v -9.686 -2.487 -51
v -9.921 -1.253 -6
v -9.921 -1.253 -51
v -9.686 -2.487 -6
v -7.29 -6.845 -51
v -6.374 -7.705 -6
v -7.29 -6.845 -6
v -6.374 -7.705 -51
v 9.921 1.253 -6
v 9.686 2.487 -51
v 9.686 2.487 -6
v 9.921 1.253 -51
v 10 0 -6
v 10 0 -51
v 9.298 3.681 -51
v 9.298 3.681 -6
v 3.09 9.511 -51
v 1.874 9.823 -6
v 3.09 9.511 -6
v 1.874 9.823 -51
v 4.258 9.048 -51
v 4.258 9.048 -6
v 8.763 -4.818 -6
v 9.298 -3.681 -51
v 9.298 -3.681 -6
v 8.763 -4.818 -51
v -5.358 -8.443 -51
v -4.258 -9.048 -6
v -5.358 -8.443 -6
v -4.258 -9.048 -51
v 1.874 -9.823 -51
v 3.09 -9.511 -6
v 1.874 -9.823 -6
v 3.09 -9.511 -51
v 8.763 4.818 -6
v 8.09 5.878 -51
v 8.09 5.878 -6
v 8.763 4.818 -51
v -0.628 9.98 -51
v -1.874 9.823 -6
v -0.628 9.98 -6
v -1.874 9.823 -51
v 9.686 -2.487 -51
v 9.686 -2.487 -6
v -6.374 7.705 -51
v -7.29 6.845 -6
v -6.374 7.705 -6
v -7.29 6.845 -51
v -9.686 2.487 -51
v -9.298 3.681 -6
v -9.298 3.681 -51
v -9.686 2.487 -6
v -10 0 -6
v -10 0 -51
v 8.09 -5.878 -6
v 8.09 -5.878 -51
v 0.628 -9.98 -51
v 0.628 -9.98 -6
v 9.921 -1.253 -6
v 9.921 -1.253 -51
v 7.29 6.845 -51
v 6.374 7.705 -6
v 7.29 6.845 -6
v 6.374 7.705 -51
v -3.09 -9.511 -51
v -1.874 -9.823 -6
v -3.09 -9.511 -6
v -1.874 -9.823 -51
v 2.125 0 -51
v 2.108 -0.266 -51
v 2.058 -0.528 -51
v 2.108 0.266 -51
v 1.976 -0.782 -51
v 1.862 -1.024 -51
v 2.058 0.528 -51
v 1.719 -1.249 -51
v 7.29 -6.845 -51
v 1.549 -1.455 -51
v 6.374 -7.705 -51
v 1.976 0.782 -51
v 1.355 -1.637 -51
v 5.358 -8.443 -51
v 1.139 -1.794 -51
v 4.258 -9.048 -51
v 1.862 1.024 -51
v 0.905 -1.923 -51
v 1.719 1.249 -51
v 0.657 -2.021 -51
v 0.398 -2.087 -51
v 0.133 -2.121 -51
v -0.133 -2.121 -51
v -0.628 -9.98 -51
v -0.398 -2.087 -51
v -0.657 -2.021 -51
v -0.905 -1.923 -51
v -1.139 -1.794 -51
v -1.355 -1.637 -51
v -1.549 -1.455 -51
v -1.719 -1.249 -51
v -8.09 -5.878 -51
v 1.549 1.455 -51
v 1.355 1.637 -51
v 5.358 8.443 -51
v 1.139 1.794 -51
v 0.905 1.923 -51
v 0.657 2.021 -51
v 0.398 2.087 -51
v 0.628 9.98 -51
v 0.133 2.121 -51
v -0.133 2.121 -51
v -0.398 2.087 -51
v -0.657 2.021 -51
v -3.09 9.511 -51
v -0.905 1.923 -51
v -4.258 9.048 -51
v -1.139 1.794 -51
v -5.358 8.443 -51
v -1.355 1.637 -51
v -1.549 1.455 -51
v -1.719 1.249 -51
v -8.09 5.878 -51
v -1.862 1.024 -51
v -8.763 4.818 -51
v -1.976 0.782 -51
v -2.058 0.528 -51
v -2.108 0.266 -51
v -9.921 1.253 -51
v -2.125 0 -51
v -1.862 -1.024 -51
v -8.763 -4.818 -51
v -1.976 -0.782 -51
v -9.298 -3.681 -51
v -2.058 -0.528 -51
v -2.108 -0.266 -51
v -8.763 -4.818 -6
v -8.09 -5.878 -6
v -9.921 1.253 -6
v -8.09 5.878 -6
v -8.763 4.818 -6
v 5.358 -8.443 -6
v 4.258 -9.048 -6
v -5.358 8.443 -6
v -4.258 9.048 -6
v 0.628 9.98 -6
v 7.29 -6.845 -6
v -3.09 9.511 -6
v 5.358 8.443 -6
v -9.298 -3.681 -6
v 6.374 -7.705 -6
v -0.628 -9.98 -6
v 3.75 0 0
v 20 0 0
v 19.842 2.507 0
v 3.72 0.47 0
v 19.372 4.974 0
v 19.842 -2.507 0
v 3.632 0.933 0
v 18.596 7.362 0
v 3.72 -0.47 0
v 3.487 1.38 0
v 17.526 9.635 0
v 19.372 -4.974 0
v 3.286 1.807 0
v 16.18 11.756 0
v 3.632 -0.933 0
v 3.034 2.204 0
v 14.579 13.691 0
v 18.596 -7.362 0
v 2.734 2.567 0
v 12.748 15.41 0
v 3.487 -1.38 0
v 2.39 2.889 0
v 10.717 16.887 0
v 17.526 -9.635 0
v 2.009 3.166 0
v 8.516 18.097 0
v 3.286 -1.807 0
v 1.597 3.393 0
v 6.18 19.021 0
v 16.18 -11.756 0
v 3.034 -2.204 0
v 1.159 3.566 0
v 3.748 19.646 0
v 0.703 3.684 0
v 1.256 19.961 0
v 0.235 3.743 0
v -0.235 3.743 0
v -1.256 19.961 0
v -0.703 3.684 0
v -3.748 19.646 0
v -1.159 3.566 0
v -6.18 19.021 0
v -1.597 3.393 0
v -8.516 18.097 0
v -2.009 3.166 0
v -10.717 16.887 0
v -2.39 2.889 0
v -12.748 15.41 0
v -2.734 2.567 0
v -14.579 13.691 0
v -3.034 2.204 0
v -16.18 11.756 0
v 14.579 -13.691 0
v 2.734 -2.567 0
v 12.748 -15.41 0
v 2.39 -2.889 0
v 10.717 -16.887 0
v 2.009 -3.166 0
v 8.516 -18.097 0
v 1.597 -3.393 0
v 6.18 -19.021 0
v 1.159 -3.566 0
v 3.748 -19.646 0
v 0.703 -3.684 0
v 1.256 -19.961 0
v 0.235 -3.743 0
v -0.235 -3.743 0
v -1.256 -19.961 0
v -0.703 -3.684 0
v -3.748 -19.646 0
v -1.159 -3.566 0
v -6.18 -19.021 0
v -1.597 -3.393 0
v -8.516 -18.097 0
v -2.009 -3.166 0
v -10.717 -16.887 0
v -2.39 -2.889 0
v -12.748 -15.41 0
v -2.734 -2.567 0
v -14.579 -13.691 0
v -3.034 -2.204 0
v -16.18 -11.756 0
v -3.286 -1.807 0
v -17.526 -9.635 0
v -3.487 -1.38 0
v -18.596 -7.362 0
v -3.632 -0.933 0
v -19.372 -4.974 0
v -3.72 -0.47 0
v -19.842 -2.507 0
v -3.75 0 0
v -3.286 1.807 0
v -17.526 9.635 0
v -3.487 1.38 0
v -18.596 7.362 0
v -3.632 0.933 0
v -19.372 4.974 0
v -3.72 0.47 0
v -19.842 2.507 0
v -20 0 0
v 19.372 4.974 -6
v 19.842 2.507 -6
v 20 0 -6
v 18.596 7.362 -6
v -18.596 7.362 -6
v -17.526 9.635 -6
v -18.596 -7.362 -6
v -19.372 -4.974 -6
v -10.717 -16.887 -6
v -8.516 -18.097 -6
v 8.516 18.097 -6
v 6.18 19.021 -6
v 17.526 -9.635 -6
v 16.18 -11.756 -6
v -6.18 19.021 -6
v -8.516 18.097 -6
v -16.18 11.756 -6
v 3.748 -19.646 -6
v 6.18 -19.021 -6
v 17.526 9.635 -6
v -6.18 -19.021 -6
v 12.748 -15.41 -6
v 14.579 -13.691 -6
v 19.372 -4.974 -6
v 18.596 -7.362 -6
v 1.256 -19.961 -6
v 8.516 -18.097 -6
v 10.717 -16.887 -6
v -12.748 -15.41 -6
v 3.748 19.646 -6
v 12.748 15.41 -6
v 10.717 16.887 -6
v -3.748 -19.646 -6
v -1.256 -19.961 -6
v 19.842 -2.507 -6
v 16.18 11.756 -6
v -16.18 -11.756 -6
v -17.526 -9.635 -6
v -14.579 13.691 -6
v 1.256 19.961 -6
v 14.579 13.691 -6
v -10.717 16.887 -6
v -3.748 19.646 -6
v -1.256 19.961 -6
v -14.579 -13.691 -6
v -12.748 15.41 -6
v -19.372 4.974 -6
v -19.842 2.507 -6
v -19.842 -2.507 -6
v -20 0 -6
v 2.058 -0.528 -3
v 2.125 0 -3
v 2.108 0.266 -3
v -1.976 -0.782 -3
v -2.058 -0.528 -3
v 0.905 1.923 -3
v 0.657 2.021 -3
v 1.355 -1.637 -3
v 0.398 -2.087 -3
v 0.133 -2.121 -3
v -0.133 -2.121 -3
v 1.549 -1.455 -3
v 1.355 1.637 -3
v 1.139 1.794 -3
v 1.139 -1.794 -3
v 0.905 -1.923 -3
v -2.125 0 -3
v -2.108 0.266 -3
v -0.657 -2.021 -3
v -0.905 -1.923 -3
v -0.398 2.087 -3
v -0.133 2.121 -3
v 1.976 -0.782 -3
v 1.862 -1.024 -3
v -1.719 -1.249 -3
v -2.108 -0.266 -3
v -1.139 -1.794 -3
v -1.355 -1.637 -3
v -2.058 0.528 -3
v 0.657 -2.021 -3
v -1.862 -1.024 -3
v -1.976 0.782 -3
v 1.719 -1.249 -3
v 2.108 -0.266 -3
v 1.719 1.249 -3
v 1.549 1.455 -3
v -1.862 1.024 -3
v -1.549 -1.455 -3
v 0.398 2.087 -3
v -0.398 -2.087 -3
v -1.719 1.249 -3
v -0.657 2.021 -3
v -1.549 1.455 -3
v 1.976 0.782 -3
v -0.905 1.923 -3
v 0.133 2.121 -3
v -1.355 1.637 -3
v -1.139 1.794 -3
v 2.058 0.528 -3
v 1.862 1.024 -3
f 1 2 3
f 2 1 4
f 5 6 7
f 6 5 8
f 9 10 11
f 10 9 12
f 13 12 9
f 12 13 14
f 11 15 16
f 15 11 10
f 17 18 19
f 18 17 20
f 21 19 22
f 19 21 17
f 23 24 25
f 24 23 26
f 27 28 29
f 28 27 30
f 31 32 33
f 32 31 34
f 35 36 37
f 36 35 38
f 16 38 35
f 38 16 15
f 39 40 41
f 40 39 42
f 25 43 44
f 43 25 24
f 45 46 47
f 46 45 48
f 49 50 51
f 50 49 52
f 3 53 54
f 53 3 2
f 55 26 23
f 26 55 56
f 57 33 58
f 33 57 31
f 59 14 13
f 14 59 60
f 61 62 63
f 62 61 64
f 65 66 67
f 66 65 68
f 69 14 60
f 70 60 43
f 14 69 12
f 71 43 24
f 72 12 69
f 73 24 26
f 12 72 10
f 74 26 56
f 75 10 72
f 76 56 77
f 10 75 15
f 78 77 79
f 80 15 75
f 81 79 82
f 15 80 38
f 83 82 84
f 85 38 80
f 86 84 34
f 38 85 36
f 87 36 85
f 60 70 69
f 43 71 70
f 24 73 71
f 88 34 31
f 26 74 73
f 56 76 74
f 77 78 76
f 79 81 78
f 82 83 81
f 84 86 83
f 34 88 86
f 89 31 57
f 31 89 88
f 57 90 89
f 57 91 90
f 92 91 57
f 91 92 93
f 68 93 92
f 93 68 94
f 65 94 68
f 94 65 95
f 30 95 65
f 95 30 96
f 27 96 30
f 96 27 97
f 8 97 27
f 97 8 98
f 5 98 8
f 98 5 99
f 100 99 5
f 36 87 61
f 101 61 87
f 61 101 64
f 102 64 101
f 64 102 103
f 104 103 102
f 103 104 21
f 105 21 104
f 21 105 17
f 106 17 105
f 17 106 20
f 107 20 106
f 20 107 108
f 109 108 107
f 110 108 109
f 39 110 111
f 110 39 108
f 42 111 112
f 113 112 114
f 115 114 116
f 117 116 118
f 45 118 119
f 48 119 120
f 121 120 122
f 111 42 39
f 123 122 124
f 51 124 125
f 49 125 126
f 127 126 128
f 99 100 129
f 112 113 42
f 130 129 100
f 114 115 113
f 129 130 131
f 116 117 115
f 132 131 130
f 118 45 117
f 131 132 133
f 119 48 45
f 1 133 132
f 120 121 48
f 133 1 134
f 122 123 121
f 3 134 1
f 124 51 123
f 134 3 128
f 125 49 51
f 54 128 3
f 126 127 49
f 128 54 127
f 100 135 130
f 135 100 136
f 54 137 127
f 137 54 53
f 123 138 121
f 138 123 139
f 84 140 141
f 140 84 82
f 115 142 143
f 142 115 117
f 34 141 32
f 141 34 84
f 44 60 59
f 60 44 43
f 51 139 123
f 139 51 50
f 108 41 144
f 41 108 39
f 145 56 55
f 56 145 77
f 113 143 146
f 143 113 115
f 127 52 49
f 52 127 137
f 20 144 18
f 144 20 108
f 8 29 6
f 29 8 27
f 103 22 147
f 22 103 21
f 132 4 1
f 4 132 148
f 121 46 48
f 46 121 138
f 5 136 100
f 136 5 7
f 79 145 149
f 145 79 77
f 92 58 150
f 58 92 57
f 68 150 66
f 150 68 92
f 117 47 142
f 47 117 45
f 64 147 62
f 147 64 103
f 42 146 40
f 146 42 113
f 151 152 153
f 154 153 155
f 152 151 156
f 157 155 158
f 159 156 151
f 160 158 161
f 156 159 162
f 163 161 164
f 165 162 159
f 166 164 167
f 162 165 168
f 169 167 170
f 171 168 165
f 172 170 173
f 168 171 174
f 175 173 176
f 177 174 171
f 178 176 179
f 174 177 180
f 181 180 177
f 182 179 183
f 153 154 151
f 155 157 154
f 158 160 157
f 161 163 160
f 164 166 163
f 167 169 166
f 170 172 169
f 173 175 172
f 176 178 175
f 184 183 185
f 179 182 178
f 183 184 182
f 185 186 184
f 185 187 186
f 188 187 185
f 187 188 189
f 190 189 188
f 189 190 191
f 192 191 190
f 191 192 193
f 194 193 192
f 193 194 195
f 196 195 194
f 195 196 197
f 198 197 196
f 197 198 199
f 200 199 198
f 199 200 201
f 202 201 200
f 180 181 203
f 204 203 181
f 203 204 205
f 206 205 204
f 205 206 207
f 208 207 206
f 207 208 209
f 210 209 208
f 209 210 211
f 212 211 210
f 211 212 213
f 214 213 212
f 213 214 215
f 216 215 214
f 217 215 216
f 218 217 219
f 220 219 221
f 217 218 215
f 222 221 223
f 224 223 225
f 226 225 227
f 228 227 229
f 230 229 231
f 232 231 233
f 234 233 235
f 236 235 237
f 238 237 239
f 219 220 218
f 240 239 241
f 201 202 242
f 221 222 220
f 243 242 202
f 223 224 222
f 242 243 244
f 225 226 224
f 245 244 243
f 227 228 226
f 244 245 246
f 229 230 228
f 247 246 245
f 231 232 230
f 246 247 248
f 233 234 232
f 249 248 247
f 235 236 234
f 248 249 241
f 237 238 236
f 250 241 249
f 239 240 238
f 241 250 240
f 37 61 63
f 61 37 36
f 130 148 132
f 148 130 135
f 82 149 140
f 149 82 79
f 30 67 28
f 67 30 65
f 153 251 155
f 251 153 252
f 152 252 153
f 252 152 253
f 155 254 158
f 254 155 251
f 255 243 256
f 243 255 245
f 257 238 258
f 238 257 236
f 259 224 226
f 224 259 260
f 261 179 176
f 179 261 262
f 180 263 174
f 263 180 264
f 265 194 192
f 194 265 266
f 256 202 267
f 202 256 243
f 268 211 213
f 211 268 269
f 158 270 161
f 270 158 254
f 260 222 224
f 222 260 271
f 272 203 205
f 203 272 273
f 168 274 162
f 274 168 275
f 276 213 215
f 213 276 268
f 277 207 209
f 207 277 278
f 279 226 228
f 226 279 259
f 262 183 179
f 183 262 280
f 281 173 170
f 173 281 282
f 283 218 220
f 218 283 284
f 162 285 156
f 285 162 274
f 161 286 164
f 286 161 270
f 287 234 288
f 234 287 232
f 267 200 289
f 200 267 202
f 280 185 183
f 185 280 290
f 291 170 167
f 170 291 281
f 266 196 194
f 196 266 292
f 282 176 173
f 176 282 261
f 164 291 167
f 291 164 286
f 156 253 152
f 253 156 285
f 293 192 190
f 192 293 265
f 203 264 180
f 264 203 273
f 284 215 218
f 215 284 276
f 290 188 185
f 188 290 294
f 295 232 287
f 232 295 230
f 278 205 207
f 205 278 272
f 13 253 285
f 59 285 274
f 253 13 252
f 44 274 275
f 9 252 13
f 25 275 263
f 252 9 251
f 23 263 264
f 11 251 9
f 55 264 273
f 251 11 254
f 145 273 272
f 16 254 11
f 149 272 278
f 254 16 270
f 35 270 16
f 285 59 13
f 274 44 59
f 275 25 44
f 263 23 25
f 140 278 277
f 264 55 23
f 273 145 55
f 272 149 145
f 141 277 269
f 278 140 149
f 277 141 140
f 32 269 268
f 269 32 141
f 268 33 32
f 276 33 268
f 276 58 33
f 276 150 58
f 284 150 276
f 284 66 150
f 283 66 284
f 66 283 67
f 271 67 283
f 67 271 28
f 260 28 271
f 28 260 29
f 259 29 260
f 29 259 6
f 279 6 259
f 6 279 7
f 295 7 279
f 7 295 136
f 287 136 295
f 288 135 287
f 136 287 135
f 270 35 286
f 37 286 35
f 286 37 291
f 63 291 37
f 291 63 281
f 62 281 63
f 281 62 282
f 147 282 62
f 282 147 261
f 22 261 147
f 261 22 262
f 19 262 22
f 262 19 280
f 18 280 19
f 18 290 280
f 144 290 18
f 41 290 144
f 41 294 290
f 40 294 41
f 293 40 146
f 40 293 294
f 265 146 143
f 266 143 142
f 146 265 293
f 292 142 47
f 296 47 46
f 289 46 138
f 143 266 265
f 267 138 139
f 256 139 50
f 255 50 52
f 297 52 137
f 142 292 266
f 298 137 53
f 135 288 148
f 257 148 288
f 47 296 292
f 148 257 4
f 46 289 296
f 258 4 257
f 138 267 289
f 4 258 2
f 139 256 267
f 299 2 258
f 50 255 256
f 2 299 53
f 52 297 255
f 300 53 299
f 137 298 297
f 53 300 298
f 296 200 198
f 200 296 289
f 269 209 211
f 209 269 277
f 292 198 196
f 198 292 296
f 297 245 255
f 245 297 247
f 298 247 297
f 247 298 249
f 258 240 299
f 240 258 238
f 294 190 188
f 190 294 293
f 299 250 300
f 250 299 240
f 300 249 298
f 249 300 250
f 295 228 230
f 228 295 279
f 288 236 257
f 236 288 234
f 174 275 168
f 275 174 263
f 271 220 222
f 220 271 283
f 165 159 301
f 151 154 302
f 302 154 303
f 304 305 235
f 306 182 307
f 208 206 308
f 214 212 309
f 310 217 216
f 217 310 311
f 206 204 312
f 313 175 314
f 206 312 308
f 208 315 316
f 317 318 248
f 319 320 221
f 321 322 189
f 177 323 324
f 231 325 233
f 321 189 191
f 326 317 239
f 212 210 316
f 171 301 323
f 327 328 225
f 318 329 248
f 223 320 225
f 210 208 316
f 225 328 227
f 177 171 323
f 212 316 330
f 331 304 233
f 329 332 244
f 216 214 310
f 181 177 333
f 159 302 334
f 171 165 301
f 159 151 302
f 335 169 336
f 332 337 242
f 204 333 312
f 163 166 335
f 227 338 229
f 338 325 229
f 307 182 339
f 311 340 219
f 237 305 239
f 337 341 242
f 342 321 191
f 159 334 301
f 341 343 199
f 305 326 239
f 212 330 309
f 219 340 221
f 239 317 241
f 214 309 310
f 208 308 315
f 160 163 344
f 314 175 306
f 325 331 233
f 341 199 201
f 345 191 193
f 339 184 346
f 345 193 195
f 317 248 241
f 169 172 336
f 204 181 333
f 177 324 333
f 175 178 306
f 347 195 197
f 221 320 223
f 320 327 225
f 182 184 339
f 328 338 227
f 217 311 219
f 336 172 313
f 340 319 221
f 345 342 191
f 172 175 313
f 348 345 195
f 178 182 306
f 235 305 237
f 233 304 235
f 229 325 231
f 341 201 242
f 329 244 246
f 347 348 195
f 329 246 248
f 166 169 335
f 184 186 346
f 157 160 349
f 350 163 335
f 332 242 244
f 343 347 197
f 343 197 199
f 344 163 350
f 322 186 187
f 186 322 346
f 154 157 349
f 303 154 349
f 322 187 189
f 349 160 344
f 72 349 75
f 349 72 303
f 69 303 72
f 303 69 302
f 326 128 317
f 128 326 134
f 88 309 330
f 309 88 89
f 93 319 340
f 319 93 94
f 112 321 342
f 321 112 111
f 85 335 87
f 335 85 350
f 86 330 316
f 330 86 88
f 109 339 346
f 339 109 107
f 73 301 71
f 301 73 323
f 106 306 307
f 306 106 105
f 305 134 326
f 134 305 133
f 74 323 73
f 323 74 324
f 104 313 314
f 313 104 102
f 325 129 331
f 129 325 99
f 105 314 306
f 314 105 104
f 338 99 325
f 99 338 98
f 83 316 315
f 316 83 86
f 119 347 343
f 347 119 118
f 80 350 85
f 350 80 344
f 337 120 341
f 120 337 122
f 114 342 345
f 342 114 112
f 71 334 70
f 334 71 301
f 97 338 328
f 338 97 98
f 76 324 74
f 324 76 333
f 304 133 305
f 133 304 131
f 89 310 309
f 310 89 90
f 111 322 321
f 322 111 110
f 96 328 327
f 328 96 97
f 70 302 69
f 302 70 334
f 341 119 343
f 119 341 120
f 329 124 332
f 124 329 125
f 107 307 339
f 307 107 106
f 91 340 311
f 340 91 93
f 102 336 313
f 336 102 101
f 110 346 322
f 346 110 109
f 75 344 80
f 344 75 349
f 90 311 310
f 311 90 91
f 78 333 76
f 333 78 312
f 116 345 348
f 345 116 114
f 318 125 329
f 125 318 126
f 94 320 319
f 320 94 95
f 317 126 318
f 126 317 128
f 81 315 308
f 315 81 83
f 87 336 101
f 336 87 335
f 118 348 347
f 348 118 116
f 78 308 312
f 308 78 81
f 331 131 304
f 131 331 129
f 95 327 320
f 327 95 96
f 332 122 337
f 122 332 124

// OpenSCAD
$fn = 50;


difference() {
	union() {
		translate(v = [0, 0, -51.0000000000]) {
			cylinder(h = 51, r = 10.0000000000);
		}
		translate(v = [0, 0, -6.0000000000]) {
			cylinder(h = 6, r = 20.0000000000);
		}
	}
	union() {
		translate(v = [0, 0, 0]) {
			rotate(a = [0, 0, 0]) {
				difference() {
					union() {
						#translate(v = [0, 0, -51.0000000000]) {
							cylinder(h = 51, r = 2.0000000000);
						}
						#translate(v = [0, 0, -3]) {
							cylinder(h = 3, r1 = 2.1250000000, r2 = 3.7500000000);
						}
						#translate(v = [0, 0, -51.0000000000]) {
							cylinder(h = 51, r = 2.1250000000);
						}
						#translate(v = [0, 0, -51.0000000000]) {
							cylinder(h = 51, r = 2.0000000000);
						}
					}
					union();
				}
			}
		}
	}
}
